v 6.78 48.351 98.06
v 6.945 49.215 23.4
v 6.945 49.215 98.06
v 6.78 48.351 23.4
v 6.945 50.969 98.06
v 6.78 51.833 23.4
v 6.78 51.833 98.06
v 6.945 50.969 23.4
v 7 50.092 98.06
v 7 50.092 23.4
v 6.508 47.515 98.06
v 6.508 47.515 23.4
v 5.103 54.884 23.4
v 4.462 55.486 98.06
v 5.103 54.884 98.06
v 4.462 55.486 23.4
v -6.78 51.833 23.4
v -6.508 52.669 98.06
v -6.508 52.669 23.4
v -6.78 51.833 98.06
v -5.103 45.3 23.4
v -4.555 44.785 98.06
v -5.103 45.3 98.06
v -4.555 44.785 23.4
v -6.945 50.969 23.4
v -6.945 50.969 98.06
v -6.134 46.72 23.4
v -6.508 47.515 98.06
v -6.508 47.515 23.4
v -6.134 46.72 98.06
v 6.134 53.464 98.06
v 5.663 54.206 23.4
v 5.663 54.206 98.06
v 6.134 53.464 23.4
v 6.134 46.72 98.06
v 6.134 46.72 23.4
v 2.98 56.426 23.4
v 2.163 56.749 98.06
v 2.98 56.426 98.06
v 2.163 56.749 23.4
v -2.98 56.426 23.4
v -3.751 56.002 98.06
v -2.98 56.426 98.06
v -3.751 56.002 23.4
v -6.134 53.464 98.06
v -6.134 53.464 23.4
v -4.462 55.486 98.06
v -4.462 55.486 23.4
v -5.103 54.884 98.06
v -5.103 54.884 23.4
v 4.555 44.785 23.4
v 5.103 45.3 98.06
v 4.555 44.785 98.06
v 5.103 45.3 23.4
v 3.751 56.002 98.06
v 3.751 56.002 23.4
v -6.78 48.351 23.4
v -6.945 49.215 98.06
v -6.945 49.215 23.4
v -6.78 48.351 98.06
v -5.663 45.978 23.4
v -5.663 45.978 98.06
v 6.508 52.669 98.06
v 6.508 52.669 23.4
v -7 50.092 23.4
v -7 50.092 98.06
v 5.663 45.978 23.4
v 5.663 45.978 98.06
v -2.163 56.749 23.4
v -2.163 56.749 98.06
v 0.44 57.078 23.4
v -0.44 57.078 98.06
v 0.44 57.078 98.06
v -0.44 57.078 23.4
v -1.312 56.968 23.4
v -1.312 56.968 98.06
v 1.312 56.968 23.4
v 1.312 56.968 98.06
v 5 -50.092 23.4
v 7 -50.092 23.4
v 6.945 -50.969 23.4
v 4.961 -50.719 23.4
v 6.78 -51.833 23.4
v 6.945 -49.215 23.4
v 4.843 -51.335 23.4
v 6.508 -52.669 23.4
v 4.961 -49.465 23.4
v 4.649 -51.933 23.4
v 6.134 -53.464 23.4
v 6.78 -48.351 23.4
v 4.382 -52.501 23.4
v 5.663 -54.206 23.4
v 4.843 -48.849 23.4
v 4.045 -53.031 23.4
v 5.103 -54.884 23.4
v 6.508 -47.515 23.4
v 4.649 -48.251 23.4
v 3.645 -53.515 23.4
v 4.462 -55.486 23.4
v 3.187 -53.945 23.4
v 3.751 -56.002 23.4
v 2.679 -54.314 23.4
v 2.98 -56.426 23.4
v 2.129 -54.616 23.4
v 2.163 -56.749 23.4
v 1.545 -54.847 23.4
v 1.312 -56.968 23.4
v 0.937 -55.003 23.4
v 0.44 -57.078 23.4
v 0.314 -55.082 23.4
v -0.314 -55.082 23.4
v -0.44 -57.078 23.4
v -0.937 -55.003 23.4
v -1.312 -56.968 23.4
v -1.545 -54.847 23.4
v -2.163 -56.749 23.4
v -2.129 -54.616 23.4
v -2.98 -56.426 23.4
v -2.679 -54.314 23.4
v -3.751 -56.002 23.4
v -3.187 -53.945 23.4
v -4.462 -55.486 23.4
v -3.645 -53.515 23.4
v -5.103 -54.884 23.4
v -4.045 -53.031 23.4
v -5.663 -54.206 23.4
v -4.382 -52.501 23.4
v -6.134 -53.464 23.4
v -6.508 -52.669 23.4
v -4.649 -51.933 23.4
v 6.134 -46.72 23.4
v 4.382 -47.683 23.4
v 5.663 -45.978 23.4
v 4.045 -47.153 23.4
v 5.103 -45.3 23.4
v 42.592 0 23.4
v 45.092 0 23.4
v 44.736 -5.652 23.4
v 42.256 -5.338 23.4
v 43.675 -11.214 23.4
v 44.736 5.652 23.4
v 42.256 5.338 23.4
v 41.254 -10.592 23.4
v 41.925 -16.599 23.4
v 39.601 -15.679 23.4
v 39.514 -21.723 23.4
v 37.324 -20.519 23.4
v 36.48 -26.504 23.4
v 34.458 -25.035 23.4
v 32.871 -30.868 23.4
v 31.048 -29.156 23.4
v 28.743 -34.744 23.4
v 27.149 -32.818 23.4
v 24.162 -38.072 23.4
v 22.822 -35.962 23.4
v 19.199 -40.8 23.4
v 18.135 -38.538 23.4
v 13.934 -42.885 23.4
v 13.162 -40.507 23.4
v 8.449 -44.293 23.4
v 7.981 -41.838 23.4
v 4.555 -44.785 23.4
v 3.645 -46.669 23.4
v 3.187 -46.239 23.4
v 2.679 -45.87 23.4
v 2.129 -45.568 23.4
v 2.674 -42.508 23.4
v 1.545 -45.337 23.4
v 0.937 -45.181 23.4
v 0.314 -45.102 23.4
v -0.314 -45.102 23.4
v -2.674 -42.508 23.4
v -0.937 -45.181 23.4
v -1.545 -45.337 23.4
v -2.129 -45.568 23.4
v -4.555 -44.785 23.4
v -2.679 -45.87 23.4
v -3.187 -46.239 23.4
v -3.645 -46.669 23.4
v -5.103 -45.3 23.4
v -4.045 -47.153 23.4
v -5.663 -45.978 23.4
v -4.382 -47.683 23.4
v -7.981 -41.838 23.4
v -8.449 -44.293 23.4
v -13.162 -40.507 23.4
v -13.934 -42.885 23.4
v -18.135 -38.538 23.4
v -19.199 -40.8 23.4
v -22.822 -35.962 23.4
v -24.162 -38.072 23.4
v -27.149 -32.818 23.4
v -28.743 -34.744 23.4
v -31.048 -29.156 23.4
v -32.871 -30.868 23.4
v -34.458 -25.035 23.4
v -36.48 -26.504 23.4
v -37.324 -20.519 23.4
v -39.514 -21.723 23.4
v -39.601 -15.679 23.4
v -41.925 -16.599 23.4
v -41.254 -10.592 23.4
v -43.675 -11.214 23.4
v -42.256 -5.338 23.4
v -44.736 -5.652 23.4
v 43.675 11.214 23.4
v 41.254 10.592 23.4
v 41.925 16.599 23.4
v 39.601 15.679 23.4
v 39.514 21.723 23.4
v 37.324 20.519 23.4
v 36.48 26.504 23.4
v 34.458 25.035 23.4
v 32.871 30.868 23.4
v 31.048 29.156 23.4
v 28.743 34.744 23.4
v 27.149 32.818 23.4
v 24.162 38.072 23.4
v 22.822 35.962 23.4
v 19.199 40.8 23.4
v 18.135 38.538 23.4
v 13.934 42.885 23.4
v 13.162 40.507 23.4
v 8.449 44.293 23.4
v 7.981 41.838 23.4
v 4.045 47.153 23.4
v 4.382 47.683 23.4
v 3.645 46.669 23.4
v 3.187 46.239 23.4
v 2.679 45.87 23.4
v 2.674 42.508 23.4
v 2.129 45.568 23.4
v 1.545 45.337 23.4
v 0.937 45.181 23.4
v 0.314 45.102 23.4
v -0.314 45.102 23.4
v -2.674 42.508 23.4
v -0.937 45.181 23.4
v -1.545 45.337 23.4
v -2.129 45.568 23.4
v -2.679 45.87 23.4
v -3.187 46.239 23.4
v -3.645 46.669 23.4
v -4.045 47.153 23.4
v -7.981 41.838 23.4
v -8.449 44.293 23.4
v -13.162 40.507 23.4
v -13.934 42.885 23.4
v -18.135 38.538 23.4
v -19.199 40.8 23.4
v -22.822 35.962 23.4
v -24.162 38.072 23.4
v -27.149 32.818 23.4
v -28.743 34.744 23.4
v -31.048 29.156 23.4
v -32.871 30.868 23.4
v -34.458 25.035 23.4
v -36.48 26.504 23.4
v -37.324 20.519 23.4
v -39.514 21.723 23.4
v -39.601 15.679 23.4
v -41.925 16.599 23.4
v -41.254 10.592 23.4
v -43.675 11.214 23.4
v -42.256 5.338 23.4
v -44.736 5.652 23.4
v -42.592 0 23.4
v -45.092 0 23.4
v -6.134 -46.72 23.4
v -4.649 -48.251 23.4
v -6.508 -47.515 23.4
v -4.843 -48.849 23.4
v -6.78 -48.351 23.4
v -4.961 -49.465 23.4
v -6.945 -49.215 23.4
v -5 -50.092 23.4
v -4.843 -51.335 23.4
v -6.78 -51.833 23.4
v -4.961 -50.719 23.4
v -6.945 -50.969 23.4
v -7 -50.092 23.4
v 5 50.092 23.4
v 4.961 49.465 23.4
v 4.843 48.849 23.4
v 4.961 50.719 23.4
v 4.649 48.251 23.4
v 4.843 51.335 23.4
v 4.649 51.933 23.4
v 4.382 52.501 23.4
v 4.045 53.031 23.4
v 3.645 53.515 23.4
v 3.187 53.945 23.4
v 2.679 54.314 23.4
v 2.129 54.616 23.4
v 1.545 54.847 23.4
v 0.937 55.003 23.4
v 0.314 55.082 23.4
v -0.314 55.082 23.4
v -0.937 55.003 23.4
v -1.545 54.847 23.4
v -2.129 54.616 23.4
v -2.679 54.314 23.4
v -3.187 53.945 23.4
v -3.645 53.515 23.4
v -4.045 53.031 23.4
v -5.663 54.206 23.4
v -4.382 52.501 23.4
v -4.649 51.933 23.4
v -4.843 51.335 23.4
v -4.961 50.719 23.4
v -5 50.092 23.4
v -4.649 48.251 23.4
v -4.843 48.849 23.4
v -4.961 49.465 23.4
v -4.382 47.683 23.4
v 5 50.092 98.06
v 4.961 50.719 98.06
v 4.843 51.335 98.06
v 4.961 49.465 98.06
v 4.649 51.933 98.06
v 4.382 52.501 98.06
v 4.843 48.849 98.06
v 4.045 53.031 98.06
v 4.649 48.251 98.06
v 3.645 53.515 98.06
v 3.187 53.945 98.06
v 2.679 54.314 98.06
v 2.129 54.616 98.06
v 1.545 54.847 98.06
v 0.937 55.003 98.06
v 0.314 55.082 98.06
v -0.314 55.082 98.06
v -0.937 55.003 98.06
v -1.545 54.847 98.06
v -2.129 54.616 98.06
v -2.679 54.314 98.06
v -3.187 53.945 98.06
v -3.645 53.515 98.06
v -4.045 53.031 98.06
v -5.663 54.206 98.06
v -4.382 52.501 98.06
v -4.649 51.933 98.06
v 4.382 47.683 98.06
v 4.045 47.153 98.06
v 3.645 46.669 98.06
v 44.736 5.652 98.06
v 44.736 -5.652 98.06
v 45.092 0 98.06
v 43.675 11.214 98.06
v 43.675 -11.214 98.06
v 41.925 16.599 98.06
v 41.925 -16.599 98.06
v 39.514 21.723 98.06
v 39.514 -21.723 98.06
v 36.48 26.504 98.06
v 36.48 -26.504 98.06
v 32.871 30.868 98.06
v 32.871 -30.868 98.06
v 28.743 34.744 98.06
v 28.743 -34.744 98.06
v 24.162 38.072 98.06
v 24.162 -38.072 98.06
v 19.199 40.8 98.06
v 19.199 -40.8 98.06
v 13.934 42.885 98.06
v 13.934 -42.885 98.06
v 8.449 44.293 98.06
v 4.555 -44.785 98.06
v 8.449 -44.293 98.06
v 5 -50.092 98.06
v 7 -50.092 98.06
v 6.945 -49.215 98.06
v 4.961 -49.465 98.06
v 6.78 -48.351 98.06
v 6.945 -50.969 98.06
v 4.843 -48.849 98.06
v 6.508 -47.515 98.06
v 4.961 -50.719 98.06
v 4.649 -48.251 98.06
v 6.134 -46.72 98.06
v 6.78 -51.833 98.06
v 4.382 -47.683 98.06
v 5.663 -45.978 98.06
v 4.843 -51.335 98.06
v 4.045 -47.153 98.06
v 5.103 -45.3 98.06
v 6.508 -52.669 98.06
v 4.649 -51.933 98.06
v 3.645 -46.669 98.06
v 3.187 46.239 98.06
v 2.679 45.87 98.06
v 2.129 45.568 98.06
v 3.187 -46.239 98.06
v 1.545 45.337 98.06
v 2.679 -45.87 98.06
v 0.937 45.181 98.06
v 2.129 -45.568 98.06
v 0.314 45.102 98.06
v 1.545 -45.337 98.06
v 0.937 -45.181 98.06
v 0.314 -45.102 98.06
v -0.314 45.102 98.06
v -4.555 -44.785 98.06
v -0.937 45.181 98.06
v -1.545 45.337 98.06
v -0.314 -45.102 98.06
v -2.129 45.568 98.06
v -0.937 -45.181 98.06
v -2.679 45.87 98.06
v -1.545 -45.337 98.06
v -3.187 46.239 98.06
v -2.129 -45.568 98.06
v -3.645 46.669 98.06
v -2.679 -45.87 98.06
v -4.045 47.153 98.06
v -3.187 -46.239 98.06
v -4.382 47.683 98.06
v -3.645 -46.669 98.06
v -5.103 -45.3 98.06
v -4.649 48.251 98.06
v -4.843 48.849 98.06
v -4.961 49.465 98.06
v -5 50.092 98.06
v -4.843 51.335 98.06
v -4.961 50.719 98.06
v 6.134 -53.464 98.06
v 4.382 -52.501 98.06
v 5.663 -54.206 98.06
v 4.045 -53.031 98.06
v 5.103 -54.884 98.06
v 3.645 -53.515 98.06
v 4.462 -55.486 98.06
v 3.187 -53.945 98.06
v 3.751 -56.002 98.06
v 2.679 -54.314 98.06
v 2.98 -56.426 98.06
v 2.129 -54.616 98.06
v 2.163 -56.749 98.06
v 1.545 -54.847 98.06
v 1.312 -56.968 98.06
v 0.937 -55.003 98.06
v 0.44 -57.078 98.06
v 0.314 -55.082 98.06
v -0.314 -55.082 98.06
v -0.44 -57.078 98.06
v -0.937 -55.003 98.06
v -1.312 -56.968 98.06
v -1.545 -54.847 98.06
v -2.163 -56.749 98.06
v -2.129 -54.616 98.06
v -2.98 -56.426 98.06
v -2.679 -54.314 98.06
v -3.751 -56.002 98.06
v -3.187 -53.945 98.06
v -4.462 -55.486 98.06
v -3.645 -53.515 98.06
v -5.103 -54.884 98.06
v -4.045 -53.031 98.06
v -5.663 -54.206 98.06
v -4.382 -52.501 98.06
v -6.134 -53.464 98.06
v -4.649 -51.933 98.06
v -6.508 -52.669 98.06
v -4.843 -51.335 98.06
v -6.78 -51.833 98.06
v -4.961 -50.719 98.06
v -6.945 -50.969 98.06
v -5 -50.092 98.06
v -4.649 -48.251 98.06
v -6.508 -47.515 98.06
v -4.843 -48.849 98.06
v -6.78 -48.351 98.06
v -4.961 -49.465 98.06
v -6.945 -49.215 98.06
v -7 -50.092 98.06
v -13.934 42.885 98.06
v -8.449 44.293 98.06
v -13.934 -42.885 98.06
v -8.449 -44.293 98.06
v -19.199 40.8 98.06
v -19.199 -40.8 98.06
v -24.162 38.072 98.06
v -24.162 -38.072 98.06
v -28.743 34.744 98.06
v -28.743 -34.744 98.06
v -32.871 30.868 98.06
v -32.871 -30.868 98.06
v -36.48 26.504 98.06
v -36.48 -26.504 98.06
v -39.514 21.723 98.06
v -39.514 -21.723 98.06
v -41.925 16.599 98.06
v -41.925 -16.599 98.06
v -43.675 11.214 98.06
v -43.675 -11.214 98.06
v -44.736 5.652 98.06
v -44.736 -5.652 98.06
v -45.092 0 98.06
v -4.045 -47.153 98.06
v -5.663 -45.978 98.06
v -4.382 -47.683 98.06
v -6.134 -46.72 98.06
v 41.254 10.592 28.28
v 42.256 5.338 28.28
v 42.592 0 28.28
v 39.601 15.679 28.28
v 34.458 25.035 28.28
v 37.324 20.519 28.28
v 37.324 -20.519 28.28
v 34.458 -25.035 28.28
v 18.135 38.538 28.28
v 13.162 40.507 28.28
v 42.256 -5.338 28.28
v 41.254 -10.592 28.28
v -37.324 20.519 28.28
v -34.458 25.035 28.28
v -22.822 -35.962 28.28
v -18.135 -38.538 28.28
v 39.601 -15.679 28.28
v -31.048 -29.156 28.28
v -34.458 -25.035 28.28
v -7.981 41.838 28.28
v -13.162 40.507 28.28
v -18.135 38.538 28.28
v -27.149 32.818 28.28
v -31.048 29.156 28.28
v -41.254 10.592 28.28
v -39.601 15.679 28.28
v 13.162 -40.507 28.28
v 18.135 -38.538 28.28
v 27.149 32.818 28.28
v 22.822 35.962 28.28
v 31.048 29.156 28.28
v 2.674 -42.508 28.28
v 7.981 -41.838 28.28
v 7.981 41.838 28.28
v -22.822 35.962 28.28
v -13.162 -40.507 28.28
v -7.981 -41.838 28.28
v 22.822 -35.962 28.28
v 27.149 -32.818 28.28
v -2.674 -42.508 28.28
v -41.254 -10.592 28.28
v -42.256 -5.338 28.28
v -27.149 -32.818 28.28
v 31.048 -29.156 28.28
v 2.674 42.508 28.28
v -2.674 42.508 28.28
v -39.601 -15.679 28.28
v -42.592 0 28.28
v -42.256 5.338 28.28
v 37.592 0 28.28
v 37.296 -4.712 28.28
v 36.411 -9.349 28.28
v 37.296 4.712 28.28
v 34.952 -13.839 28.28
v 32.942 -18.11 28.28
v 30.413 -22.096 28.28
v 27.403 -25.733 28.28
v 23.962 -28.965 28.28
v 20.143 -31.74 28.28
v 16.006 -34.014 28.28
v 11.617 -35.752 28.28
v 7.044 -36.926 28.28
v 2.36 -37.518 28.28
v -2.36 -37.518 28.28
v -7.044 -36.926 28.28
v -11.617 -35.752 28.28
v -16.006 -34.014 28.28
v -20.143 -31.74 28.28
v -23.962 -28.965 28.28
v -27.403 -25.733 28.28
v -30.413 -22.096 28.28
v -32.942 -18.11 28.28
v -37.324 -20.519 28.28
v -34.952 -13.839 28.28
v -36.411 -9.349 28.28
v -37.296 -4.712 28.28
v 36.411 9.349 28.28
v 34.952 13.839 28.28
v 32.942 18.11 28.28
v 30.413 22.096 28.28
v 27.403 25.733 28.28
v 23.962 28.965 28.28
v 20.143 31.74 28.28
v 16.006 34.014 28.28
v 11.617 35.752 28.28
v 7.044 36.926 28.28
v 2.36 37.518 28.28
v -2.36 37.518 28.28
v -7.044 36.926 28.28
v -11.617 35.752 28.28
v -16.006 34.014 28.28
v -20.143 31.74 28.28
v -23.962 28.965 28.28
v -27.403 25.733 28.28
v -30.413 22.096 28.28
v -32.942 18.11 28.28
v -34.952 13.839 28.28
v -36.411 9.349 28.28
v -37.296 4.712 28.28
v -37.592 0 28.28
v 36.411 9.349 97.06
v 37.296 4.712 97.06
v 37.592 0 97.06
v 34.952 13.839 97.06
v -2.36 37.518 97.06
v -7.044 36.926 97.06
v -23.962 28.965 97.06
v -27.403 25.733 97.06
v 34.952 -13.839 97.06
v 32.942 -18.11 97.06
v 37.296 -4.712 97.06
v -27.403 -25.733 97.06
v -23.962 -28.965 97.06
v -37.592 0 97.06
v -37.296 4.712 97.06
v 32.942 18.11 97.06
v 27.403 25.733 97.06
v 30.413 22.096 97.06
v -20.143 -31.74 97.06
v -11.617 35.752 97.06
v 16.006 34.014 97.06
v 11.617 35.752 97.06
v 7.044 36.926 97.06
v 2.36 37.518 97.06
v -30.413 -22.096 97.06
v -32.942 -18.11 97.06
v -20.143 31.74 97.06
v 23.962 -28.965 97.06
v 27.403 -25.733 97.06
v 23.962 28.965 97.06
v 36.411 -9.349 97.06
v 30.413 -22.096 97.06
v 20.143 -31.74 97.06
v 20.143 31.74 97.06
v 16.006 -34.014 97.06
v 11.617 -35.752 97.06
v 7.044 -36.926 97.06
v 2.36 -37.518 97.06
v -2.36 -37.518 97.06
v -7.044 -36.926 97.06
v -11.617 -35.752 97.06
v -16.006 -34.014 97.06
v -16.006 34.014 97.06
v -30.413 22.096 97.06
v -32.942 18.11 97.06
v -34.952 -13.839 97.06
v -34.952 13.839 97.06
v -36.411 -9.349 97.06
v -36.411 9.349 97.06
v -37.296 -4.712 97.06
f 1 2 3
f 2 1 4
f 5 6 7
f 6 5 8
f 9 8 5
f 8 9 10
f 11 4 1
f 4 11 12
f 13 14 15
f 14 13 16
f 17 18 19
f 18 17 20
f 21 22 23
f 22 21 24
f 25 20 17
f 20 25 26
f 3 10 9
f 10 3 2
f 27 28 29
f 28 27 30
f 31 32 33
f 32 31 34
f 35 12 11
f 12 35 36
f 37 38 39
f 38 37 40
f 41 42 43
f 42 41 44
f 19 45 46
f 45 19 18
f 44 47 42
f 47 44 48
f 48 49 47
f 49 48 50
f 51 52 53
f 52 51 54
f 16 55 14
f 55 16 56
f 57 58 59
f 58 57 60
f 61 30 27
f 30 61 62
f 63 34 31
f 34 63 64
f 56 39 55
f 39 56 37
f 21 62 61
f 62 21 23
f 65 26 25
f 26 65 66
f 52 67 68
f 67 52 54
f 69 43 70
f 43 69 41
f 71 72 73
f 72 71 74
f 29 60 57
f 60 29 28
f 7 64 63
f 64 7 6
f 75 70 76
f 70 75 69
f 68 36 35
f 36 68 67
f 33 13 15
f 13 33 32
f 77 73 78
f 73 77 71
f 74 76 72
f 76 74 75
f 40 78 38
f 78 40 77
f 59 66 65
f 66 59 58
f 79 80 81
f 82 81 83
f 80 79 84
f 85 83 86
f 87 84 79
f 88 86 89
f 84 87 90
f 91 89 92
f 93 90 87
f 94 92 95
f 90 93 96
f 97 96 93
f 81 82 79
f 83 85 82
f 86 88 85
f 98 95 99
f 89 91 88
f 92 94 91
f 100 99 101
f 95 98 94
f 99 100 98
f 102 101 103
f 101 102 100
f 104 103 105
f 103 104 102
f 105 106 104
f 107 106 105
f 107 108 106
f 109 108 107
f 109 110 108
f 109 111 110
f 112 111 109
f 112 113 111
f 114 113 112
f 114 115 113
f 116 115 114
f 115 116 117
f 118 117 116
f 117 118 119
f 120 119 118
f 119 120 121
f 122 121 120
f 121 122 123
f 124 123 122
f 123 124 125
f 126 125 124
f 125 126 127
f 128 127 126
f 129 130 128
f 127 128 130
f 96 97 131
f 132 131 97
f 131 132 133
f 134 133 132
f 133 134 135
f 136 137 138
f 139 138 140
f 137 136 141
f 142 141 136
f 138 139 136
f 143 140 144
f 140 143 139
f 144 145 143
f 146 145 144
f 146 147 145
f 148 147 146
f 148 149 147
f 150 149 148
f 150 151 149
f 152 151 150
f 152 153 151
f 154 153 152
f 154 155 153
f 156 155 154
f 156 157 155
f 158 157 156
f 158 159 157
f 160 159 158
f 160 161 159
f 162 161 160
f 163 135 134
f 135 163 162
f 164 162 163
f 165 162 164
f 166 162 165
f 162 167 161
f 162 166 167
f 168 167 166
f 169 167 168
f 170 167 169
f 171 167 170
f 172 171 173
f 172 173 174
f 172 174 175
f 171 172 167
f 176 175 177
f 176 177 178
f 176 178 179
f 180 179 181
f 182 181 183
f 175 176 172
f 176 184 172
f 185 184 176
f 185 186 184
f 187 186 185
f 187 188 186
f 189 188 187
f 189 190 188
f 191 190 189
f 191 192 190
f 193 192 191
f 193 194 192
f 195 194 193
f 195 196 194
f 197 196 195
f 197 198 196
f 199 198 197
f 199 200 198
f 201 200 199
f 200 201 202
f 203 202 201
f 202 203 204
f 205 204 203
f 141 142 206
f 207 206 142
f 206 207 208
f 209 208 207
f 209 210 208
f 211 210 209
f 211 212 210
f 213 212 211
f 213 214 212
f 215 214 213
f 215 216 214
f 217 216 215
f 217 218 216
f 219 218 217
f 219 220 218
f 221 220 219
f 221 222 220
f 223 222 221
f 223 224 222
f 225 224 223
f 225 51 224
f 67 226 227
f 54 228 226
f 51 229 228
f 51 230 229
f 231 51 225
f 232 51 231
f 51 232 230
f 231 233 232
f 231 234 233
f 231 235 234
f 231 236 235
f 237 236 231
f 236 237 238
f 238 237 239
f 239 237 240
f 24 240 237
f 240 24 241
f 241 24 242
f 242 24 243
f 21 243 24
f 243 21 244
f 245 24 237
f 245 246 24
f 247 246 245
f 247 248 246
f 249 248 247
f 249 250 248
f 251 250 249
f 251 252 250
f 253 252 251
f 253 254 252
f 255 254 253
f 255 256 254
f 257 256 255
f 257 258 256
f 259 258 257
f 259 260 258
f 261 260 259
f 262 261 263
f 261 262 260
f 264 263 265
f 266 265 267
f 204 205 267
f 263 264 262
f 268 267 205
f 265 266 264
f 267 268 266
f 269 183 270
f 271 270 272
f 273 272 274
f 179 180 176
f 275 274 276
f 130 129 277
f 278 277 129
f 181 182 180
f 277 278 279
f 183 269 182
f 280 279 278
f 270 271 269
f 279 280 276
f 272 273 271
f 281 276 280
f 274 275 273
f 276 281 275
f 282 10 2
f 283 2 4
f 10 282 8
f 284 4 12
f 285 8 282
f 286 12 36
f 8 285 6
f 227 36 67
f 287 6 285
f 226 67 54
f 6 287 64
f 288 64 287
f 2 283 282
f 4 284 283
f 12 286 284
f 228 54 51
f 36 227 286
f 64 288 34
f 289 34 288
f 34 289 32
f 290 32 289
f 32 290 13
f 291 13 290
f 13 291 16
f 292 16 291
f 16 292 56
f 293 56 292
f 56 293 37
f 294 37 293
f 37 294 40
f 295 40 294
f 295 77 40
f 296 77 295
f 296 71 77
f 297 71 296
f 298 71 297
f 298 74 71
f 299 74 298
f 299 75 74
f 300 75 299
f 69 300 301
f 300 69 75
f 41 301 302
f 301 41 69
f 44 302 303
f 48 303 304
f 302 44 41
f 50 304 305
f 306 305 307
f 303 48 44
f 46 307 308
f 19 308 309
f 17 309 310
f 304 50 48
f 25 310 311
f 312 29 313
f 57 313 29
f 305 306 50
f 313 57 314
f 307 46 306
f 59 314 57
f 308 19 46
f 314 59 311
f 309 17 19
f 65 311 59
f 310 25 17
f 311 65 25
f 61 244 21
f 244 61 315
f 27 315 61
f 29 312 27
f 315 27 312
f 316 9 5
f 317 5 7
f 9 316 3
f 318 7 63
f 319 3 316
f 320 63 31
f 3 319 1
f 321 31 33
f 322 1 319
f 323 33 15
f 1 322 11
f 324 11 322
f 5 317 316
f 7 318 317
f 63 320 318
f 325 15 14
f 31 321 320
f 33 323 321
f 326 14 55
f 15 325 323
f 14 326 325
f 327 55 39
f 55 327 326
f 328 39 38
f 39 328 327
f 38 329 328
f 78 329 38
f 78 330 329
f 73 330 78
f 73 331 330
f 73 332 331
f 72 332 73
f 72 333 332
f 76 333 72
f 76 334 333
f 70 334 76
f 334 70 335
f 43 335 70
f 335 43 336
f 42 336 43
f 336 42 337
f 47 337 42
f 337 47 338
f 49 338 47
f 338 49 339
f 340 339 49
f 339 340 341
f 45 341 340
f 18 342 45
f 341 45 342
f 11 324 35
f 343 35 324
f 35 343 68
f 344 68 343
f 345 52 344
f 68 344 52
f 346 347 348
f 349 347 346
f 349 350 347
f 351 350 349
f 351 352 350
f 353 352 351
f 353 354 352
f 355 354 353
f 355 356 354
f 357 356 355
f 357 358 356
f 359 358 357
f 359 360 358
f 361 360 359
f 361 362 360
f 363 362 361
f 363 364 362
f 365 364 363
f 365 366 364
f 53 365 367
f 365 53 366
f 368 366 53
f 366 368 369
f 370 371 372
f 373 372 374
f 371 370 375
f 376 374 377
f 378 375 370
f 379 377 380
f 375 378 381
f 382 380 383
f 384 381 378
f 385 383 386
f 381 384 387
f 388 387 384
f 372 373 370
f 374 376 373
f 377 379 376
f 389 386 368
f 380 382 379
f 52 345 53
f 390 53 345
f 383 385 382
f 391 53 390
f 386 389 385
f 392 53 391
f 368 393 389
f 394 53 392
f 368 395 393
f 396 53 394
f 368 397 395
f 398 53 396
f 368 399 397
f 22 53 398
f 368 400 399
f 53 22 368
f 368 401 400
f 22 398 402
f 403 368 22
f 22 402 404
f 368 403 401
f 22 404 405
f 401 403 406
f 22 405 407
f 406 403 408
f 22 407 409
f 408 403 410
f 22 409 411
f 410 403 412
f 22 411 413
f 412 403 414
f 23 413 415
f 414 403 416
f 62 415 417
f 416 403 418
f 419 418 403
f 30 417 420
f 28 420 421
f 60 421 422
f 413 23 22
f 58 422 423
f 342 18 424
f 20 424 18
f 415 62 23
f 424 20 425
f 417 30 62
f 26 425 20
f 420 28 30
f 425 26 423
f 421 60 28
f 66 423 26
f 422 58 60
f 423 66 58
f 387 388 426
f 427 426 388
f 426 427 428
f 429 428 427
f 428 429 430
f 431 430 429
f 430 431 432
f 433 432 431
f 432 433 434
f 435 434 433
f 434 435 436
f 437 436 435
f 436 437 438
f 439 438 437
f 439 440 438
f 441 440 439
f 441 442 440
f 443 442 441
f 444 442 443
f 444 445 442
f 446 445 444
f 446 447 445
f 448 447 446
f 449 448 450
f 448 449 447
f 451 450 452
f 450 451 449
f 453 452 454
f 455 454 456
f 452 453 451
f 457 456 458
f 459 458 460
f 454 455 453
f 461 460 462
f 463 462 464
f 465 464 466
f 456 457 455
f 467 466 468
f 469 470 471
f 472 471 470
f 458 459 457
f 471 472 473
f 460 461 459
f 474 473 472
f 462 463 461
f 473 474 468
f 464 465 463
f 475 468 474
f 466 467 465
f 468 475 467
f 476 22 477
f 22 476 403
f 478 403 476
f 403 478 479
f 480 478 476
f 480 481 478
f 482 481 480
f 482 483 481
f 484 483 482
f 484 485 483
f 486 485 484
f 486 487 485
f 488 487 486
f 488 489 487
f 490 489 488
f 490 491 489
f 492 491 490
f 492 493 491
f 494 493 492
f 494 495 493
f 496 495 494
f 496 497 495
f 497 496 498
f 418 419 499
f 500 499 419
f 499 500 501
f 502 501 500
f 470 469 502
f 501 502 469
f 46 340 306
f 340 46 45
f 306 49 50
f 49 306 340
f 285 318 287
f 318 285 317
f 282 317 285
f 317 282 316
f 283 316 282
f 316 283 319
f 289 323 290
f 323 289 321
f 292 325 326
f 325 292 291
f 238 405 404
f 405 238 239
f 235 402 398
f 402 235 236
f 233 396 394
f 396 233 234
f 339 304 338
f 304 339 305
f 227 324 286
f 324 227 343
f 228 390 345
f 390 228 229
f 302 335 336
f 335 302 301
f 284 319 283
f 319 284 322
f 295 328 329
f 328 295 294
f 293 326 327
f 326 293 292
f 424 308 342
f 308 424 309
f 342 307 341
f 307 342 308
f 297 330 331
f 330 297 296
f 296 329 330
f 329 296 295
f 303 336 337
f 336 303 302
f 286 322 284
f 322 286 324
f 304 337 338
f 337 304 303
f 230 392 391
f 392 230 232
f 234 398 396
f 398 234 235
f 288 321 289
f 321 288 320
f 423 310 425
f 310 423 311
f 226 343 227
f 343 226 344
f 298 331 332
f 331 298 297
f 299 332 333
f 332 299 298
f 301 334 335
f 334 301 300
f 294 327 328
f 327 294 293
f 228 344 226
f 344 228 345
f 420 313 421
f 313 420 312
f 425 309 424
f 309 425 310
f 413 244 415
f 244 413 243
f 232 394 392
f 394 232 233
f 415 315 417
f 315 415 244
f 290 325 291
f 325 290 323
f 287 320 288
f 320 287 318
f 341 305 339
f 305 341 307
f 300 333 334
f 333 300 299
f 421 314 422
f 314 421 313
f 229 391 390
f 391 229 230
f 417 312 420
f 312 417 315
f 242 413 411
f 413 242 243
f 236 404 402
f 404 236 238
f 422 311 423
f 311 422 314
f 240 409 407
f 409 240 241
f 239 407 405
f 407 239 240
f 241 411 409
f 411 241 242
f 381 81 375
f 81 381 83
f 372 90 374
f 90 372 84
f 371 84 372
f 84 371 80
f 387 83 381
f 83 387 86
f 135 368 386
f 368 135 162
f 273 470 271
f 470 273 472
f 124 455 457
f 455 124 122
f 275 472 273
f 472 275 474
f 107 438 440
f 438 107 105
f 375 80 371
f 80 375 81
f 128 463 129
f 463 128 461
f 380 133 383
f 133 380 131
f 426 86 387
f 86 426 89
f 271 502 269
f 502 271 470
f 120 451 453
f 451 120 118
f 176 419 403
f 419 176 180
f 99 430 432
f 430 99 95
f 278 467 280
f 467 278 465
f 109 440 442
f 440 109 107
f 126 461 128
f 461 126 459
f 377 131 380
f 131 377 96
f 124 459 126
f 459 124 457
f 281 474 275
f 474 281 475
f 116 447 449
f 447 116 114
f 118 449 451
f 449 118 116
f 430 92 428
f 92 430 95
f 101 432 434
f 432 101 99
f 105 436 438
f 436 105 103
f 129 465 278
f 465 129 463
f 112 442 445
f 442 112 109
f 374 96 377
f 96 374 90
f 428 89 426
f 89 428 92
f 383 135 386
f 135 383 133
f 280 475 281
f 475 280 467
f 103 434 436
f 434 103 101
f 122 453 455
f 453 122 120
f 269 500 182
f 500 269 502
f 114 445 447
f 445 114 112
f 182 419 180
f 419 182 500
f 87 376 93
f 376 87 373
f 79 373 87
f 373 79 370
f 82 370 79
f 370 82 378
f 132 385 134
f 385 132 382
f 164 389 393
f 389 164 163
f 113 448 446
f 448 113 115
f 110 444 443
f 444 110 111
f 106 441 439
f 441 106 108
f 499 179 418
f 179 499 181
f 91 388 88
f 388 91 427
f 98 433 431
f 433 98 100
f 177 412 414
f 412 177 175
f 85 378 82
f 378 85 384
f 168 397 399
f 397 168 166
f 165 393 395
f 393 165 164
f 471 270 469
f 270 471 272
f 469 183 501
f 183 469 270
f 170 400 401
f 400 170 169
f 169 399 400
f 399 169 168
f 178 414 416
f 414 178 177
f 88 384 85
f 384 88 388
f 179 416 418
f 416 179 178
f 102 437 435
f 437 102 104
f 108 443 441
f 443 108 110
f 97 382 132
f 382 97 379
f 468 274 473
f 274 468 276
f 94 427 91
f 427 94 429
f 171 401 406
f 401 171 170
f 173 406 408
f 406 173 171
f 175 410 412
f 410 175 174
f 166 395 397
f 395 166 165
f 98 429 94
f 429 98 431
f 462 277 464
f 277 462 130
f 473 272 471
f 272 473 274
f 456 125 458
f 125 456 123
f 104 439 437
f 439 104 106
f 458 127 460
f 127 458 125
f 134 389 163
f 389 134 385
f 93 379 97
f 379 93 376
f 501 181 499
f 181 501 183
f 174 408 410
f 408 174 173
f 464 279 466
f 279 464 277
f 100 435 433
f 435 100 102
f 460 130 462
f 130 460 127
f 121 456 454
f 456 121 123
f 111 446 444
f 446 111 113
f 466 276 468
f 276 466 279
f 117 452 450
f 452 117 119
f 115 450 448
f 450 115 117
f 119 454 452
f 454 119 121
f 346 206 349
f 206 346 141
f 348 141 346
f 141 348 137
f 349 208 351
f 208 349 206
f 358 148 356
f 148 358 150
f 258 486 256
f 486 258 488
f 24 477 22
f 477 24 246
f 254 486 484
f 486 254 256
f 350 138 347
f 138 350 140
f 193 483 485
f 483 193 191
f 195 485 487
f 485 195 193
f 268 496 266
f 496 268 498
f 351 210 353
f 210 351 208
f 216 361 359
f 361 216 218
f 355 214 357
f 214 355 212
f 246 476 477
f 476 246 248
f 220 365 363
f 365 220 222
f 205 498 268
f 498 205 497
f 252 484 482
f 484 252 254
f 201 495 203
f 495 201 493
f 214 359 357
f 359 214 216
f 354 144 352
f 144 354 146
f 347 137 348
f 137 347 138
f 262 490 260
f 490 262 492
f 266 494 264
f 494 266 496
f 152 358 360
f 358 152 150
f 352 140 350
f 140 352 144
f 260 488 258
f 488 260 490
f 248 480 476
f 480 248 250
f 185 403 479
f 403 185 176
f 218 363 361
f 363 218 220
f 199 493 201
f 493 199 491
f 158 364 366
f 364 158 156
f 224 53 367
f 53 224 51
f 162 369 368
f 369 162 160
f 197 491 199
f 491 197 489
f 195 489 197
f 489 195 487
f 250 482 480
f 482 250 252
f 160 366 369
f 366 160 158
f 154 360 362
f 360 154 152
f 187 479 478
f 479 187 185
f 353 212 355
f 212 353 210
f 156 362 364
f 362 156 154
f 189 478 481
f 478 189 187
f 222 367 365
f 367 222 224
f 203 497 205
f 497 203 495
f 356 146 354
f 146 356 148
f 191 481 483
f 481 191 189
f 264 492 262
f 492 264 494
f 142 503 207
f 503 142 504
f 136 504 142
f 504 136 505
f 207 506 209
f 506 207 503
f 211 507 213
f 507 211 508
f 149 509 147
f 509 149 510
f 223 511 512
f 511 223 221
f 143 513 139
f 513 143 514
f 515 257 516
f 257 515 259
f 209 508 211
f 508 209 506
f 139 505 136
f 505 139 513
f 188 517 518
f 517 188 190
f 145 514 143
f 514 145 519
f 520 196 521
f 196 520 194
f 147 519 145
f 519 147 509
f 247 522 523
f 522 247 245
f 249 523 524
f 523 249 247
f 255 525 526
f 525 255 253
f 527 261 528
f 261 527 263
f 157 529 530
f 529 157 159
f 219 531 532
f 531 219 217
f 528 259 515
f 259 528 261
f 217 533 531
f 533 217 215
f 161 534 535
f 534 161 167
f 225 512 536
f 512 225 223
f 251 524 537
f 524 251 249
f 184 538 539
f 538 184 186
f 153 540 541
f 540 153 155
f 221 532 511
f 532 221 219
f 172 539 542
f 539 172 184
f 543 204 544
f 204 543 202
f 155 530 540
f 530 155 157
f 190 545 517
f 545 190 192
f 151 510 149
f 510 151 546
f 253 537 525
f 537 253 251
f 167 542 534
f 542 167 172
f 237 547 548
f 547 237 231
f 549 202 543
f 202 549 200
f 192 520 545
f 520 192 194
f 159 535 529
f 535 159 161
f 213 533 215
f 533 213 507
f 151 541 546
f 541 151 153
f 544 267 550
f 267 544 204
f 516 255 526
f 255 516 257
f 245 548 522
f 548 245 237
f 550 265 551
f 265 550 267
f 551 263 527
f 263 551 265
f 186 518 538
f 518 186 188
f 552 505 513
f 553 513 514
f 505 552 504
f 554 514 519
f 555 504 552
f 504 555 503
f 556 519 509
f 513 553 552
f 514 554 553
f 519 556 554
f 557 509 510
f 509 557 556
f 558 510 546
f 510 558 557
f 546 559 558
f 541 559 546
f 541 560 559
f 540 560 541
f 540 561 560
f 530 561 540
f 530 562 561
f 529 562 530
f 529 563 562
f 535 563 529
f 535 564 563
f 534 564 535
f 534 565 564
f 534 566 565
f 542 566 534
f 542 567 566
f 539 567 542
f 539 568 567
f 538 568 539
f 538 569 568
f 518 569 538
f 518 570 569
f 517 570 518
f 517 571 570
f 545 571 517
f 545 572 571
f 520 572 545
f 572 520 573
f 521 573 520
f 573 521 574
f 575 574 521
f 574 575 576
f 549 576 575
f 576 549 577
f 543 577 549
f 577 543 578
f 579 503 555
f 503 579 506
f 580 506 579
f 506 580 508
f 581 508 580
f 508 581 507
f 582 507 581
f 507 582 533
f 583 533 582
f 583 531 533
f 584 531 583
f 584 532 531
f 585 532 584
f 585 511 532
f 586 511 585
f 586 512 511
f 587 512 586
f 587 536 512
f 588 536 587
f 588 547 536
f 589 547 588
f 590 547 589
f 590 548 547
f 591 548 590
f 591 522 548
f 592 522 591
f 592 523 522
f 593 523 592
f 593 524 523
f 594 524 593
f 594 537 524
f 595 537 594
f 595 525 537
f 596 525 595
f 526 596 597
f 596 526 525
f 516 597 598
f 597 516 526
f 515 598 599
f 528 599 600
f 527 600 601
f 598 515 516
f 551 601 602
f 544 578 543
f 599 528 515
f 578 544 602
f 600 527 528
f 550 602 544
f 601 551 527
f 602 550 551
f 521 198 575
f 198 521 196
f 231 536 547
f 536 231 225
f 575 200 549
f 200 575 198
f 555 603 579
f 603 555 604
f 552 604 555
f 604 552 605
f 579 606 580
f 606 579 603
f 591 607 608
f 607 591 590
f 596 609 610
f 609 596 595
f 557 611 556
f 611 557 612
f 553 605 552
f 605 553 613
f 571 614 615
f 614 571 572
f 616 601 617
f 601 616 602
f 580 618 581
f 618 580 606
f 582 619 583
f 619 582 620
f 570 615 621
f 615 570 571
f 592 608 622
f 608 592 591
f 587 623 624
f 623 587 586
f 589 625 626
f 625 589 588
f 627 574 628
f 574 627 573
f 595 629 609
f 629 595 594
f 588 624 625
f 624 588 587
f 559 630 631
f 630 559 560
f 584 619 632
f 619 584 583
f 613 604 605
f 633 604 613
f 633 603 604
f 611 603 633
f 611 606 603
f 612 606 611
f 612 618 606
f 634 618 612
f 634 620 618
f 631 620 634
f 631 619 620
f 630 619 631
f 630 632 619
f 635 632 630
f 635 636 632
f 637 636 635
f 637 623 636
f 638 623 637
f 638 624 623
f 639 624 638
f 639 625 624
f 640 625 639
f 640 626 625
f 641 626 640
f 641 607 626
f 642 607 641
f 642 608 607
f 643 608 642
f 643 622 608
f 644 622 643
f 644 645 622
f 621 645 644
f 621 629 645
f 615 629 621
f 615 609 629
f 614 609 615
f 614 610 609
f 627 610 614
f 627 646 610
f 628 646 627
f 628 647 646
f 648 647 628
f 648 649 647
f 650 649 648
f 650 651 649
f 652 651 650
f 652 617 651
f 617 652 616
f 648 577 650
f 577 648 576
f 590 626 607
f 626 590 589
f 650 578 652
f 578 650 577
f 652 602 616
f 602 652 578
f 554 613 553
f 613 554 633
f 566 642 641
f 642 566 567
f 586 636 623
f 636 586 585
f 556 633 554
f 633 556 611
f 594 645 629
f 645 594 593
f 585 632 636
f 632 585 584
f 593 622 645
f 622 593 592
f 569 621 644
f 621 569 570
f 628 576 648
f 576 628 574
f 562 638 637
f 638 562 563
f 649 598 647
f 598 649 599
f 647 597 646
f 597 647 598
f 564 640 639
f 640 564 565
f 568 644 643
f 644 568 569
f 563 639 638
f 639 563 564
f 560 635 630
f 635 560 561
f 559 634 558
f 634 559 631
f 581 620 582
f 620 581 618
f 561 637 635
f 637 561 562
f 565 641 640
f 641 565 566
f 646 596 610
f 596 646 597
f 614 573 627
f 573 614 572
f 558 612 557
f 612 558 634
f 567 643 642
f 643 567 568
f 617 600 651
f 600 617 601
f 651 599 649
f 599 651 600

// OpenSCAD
//inner dia 2.960"
// about 1" tall

lenscapID = 2.960 * 25.4;
lenscapOD = lenscapID + 15;
lenscapHeight = 1 * 25.4 + 1;

module eyelets(height) {
		difference() {
			cylinder(r = 7, h = height);
			translate([0, 0, -1]) cylinder(r = 5, h = height + 10);
	}
}

module bottom() {
		translate([0, lenscapOD / 2 + 5, 0]) eyelets(lenscapHeight);
		translate([0, -(lenscapOD / 2 + 5), 0]) eyelets(lenscapHeight);
		difference() {
			cylinder(r = lenscapOD / 2, h = lenscapHeight);
			translate([0, 0, 5]) cylinder(r1 = lenscapID / 2, r2 = lenscapID / 2 + 4, h = lenscapHeight);
		}
}

module top() {
	// 2.840 height
	// 1.925 dia top
	topHeight = 2.9 * 25.4;
	translate([0, 0, lenscapHeight + 2]) {
		translate([0, lenscapOD / 2 + 5, -5]) eyelets(topHeight + 1);
		translate([0, -(lenscapOD / 2 + 5), -5]) eyelets(topHeight + 1);
			difference() {
					translate([0, 0, -5]) cylinder(r = lenscapOD / 2, h = topHeight  + 1);
					translate([0, 0, -5.2]) cylinder(r = (lenscapID / 2) + 5, h = 0.2 * 25.4);
					translate([0, 0, -5]) cylinder(r = lenscapID / 2, h = topHeight);
				}
	}
}

//bottom();
$fn = 50;
top();
